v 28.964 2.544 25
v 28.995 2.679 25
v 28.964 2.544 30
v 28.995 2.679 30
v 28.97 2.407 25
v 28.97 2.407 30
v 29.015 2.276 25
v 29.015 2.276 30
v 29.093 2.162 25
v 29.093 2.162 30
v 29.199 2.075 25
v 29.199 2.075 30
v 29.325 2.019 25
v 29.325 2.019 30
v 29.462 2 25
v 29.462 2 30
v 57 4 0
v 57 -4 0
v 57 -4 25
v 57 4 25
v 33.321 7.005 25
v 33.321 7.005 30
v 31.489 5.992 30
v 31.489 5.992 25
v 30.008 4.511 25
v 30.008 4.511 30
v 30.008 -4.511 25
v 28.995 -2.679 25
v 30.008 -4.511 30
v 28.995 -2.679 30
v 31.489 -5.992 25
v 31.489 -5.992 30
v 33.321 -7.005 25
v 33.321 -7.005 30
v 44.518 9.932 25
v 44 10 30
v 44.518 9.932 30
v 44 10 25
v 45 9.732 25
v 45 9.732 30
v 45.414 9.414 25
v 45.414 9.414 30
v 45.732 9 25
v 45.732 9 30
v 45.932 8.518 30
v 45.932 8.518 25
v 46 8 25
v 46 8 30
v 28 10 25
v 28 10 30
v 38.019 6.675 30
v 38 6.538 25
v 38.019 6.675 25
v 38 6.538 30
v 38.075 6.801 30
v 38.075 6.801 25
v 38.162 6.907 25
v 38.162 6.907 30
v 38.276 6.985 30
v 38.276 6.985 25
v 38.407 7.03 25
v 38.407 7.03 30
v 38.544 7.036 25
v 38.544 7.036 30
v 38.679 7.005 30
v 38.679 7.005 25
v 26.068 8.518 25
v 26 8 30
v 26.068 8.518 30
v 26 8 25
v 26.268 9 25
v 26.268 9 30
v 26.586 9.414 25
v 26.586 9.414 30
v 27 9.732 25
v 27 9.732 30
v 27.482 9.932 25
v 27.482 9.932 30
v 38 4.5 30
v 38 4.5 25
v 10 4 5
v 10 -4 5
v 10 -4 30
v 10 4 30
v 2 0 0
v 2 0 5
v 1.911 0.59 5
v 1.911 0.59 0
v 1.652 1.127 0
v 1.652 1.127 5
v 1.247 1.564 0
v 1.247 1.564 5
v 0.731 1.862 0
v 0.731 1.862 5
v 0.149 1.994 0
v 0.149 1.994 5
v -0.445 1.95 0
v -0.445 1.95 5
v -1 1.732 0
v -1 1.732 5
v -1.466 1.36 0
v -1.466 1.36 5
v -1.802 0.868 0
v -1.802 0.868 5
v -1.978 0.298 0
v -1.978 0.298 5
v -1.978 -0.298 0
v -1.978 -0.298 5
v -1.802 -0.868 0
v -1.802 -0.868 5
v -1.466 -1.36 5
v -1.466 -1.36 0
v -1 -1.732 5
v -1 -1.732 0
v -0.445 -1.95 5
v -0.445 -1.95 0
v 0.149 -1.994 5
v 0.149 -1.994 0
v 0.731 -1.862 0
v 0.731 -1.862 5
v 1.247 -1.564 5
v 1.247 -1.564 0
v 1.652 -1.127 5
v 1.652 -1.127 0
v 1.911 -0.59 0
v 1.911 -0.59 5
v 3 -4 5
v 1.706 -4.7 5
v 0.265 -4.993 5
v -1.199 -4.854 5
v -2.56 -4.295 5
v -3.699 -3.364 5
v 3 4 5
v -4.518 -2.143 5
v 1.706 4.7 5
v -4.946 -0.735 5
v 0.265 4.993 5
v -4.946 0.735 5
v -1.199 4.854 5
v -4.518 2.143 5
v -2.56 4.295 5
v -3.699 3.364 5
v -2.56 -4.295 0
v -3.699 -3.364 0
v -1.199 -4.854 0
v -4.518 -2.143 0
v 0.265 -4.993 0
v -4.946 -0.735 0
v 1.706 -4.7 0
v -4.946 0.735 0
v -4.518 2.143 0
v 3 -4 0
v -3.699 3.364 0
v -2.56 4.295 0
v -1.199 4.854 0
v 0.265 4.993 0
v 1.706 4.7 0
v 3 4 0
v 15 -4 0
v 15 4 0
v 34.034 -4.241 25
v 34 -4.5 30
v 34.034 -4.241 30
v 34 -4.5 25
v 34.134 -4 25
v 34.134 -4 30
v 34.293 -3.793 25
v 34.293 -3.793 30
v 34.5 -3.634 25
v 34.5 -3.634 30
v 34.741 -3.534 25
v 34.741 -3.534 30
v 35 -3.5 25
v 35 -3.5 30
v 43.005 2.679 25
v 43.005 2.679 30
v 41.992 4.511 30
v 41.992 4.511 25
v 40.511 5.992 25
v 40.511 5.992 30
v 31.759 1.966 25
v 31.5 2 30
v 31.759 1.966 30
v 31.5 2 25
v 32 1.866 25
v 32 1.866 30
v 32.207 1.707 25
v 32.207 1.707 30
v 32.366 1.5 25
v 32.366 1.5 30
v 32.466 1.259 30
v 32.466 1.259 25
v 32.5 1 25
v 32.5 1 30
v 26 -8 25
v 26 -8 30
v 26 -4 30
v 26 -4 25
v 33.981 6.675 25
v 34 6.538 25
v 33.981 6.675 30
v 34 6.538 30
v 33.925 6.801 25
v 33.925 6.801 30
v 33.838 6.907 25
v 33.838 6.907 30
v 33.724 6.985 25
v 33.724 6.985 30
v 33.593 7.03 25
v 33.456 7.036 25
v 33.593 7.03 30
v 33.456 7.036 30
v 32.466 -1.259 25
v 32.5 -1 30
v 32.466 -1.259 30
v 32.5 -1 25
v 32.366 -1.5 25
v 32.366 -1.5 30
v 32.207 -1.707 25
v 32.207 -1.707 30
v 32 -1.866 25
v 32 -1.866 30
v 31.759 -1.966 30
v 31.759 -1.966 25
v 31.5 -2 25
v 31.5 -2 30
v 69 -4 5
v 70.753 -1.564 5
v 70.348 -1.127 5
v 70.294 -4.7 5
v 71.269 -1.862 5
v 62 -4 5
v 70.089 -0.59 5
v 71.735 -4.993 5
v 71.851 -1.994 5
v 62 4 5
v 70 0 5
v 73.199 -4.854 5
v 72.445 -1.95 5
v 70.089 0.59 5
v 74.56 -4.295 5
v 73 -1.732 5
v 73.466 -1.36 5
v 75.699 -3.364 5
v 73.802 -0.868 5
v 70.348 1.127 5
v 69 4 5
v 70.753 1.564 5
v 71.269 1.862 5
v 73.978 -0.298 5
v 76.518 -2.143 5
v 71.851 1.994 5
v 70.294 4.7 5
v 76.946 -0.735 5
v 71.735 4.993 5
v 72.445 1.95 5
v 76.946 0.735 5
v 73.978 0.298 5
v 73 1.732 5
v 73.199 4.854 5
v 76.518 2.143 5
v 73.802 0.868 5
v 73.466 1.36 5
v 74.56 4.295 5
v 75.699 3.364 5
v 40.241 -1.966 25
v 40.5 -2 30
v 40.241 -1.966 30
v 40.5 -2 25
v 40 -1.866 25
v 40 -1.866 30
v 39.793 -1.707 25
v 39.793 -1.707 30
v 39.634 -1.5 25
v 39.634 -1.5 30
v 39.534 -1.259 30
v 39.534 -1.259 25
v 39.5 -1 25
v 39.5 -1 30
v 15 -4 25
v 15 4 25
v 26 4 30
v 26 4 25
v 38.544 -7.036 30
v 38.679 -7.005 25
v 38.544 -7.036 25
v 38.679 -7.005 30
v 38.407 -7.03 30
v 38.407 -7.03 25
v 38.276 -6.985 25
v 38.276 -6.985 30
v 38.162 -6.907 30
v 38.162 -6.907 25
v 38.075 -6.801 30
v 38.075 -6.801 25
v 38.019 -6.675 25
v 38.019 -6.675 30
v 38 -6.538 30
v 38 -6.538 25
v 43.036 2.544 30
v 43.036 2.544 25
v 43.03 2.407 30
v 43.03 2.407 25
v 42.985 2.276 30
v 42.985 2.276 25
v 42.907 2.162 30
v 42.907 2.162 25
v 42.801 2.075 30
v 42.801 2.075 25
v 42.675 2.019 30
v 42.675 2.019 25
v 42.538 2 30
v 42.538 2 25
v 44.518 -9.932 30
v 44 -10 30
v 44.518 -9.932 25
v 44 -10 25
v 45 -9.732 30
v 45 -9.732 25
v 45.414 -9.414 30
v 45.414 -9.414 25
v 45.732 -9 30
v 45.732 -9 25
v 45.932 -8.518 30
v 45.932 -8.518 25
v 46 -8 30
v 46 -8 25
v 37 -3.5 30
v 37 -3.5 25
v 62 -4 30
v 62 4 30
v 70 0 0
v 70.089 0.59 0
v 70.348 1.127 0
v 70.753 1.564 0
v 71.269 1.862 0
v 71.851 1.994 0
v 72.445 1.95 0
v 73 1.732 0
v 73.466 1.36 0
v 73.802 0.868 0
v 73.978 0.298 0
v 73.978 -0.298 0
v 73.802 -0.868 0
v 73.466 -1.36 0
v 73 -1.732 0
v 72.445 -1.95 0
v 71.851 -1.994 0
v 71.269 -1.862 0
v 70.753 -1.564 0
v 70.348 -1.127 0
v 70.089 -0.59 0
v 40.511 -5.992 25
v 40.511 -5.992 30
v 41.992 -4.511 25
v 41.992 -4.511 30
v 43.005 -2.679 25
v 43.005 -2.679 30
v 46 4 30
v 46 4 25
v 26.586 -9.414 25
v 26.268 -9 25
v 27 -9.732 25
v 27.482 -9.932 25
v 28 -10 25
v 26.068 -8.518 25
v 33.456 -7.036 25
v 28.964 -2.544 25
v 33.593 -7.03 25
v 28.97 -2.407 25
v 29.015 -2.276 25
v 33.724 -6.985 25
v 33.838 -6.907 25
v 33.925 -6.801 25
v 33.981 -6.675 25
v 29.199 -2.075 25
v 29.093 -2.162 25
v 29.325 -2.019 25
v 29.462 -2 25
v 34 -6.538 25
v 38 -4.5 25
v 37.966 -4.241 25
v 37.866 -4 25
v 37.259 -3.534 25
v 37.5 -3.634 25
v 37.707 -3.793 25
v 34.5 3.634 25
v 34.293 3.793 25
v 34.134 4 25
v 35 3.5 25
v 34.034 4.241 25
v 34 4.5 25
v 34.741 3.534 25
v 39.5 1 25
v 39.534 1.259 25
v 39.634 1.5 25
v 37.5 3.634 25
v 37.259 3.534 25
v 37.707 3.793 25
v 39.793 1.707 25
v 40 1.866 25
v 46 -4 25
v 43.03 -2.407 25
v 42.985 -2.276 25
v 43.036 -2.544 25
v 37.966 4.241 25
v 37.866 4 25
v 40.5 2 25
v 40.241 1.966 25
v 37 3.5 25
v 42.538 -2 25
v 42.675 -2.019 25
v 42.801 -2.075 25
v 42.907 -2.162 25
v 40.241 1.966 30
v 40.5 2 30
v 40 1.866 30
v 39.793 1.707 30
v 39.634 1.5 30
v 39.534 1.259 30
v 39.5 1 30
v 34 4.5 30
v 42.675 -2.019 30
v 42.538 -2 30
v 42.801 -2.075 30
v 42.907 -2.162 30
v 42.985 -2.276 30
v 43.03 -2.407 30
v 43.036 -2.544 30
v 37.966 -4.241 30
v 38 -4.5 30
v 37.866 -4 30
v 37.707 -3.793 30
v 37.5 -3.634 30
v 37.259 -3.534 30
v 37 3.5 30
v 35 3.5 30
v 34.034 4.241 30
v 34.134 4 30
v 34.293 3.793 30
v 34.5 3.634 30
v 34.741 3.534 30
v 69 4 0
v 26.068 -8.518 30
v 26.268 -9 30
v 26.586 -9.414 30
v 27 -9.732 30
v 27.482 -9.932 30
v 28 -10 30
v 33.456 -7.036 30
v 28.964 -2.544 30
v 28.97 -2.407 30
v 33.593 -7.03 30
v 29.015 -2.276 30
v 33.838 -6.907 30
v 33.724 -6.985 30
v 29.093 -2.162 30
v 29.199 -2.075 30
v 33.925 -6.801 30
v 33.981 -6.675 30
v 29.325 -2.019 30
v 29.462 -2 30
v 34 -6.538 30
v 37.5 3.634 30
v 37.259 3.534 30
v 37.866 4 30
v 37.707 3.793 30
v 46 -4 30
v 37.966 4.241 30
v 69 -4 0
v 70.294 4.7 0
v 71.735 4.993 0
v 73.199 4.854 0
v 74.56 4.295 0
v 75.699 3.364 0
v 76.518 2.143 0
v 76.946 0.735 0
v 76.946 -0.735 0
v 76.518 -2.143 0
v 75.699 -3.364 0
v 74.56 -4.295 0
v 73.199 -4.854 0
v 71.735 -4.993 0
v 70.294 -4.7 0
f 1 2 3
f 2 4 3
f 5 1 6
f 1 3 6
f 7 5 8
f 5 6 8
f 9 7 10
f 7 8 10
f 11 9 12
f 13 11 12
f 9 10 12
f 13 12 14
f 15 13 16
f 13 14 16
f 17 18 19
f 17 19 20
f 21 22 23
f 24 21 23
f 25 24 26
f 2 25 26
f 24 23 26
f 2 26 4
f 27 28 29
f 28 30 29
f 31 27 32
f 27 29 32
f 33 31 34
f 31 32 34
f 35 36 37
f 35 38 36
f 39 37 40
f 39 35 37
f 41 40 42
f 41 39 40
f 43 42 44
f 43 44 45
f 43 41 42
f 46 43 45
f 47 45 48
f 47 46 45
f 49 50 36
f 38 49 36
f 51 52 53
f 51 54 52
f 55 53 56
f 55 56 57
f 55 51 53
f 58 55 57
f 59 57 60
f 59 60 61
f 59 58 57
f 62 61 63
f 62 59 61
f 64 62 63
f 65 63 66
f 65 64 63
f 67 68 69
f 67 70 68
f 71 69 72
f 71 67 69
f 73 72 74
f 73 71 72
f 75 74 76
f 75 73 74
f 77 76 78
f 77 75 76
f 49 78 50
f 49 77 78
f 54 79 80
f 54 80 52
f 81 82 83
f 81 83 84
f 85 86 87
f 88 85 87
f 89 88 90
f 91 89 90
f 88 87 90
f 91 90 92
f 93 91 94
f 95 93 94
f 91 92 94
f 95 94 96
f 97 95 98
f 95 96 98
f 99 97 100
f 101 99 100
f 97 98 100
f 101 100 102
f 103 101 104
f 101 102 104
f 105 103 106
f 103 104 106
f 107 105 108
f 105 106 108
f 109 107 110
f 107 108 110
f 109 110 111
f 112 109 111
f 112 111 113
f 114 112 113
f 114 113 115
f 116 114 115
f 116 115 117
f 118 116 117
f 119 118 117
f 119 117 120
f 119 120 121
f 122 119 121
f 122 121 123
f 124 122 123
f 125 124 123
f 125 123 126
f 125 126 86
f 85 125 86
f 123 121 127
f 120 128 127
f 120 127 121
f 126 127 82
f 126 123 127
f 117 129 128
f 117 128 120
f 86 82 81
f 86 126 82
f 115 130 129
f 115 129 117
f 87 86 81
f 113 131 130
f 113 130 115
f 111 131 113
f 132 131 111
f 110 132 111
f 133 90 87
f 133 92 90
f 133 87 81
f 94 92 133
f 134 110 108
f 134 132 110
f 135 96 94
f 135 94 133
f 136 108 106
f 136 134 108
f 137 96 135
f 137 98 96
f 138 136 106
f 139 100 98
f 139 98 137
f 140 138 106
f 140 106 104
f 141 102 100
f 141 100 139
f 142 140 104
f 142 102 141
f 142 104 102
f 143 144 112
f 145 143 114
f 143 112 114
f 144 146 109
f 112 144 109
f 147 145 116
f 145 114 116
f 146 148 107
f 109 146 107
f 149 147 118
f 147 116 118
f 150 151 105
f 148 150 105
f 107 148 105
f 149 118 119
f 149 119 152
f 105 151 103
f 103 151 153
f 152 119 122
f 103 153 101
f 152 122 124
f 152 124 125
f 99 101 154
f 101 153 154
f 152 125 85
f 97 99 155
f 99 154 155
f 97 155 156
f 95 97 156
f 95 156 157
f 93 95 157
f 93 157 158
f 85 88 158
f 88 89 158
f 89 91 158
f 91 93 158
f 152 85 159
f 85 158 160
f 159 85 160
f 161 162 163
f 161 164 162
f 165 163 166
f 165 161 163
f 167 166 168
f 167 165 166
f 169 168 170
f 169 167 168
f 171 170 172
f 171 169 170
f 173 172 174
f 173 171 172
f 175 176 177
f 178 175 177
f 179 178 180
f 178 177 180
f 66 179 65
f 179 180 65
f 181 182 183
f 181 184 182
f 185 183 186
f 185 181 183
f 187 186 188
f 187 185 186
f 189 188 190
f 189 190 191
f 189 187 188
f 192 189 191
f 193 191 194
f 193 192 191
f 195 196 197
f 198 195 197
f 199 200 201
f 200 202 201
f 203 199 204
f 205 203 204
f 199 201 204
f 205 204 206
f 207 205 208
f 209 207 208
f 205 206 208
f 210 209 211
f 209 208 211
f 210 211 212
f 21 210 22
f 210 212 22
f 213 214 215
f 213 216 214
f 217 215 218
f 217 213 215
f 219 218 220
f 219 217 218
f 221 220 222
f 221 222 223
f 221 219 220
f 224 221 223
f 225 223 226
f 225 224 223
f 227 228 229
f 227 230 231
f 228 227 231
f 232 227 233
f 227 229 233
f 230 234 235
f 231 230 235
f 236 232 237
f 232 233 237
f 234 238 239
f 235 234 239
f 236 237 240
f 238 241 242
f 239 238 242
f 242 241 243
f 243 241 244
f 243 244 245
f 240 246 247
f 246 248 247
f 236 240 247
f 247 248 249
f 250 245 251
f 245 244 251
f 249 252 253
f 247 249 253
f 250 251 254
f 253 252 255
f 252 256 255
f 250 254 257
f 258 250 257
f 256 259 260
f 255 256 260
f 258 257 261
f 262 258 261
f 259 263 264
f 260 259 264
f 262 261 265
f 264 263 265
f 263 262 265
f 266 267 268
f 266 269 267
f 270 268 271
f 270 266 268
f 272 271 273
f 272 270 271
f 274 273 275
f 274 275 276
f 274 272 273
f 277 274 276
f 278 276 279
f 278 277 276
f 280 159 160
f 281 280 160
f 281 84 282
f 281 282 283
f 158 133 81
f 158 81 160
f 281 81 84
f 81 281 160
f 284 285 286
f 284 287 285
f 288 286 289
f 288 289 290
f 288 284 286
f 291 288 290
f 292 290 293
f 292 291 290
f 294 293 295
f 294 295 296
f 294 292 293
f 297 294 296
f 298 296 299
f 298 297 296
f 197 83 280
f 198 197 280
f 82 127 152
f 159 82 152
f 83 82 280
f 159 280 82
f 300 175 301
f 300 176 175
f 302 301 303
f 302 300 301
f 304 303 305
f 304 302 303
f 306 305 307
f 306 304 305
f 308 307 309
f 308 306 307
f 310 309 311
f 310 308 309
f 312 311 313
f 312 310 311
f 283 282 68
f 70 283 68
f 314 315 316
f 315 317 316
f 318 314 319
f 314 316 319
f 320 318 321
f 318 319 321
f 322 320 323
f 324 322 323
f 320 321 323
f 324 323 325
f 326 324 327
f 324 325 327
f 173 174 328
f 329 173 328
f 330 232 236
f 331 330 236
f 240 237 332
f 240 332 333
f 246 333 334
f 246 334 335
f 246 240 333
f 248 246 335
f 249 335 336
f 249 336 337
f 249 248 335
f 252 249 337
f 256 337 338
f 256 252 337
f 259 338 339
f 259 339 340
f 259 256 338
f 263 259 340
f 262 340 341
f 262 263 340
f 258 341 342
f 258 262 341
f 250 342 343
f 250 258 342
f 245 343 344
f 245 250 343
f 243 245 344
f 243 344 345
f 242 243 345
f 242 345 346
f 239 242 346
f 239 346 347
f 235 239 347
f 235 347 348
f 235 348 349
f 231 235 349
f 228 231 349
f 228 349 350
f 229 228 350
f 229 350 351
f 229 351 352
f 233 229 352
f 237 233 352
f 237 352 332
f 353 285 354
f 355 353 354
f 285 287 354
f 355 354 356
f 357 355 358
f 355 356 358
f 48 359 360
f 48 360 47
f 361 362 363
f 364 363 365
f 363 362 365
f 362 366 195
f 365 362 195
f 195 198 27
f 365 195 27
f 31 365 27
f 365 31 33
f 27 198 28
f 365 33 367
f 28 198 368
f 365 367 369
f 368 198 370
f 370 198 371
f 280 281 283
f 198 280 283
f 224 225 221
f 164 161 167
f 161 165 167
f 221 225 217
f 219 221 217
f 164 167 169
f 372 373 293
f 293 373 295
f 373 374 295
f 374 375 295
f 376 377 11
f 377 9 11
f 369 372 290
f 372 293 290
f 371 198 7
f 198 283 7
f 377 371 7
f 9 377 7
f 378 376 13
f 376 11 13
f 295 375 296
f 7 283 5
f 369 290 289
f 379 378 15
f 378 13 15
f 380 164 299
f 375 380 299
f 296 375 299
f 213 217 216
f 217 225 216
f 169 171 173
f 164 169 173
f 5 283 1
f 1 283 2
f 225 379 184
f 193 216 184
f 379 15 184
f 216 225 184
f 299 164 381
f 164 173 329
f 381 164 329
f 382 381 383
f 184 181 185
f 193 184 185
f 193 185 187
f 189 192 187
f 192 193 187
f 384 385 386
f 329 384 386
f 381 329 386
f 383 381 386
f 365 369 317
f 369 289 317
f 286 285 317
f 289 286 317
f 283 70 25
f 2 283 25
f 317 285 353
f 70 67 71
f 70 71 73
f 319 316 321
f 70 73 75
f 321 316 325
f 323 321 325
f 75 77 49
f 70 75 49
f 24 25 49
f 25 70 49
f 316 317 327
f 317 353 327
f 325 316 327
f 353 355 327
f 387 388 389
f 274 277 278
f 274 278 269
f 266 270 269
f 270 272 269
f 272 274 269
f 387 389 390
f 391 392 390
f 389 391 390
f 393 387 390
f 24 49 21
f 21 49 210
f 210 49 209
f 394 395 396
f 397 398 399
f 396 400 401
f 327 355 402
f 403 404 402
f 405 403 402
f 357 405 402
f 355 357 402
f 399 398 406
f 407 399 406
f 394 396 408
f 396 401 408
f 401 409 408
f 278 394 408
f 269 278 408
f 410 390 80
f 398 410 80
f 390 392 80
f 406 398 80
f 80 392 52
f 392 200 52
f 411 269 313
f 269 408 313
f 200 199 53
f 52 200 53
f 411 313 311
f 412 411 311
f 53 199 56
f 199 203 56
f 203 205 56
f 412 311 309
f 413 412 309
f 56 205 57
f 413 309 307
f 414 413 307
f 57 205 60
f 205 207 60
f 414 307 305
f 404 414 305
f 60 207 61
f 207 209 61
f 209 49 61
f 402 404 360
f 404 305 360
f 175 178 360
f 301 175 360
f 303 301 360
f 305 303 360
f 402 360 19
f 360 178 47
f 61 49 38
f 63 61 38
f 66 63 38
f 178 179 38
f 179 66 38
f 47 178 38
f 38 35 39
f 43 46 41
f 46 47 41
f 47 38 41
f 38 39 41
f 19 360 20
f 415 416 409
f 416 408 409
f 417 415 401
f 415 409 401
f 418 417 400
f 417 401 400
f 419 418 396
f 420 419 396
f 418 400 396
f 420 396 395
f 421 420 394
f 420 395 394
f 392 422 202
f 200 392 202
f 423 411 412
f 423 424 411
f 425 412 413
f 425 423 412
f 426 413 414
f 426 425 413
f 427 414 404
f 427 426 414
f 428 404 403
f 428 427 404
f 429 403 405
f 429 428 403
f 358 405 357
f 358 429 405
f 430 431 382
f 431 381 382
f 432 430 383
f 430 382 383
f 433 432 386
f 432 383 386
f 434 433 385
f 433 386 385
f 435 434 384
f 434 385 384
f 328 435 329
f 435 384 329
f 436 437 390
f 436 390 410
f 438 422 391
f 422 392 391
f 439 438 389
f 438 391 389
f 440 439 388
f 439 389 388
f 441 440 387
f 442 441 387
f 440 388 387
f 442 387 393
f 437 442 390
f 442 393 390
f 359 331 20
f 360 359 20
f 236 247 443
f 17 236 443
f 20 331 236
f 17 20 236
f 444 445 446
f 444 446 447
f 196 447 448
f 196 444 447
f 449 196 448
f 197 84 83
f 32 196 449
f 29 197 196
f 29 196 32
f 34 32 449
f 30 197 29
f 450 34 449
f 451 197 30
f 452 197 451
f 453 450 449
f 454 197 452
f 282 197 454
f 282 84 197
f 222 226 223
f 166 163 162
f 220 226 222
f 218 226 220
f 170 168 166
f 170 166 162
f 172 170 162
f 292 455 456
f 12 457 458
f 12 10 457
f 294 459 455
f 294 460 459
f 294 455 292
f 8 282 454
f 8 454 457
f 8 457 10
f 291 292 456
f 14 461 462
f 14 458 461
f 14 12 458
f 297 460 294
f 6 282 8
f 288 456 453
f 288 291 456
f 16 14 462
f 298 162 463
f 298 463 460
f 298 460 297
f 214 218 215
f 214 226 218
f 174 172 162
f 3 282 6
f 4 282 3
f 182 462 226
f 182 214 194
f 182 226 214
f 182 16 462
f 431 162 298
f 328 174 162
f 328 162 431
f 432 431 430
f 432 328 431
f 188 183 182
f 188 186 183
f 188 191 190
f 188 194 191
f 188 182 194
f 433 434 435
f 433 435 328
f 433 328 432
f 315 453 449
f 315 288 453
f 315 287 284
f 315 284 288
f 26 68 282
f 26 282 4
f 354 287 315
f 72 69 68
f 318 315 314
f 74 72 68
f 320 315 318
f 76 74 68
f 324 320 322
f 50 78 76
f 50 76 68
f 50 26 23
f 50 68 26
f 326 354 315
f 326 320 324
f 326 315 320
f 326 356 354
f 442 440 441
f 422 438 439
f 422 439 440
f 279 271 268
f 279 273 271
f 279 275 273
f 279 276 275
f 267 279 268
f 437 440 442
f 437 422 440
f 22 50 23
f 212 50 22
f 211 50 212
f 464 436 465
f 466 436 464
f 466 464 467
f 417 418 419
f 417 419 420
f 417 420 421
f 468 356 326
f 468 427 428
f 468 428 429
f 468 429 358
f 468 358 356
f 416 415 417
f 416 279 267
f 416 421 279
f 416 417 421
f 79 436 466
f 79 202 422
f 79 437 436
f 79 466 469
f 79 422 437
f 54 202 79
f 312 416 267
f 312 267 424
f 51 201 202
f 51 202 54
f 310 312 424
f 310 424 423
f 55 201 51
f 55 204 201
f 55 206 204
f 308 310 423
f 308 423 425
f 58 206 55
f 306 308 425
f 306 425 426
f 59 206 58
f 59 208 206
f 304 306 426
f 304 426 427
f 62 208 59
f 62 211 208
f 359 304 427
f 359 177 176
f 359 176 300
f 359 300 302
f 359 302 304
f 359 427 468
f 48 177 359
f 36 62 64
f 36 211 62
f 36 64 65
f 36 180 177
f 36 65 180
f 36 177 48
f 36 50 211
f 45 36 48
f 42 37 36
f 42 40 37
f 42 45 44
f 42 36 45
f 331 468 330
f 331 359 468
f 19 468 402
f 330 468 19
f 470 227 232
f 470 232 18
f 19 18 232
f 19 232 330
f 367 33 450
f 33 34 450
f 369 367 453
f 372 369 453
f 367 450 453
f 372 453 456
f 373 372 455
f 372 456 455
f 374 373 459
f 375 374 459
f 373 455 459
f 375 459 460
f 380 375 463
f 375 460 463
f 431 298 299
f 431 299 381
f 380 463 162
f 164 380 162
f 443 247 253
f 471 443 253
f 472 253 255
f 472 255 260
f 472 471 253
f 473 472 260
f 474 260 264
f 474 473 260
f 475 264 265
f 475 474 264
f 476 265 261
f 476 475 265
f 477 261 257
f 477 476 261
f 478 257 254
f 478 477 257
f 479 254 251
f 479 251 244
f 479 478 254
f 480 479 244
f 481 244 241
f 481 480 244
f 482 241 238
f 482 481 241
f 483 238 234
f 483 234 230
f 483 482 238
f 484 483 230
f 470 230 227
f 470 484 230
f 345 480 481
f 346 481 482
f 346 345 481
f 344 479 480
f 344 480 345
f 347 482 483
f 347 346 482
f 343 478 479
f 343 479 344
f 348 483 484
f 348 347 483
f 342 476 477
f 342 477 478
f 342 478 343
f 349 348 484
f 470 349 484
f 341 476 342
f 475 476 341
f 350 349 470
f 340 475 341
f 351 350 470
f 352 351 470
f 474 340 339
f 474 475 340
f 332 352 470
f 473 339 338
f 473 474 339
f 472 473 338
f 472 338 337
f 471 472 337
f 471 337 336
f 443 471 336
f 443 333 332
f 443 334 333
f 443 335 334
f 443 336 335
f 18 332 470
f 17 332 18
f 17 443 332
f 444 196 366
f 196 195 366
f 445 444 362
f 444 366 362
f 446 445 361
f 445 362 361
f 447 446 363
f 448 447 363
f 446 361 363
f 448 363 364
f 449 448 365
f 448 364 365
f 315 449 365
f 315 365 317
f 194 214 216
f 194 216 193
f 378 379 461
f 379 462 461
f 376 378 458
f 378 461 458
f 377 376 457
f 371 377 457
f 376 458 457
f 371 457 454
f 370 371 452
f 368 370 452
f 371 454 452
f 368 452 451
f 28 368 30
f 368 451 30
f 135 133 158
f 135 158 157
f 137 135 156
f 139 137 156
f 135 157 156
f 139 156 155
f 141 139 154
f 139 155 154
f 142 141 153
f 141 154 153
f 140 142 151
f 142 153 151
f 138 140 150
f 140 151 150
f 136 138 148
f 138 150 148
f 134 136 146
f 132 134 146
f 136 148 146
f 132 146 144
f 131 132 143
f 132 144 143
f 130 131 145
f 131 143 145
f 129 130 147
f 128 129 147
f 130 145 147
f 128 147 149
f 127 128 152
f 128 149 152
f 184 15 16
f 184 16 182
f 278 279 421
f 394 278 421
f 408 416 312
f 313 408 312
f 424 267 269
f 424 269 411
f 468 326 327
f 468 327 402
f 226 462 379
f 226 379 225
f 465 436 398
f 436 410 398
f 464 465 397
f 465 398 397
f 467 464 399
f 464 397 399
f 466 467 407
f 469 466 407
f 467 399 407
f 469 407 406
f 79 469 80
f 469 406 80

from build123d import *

# Parameters (mm, degrees)
SKETCH_1_R          = 5
EXTRUDE_1_DEPTH     = 5
SKETCH_3_W          = 5
SKETCH_3_H          = 8
EXTRUDE_2_DEPTH     = 15
SKETCH_2_R          = 2
CUT_EXTRUDE_1_DEPTH = 30
SKETCH_6_W          = 5
SKETCH_6_H          = 8
EXTRUDE_4_DEPTH     = 25
SKETCH_7_W          = 5
SKETCH_7_H          = 8
EXTRUDE_5_DEPTH     = 21
SKETCH_8_W          = 20
SKETCH_8_H          = 20
EXTRUDE_6_DEPTH     = 5
FILLET_2_R          = 2
SKETCH_9_R          = 7.5
CUT_EXTRUDE_3_DEPTH = 5
SKETCH_10_W         = 4
SKETCH_10_H         = 4
EXTRUDE_7_DEPTH     = 5
FILLET_3_R          = 1
FILLET_4_R          = 0.5


with BuildPart() as part:
    # 草图1 → 凸台-拉伸1 (new body)
    with BuildSketch(Plane.XY):
        Circle(SKETCH_1_R)
    extrude(amount=EXTRUDE_1_DEPTH)

    # 草图3 → 凸台-拉伸2 (add)
    with BuildSketch(Plane(origin=(0, 0, 0), x_dir=(0, 0, -1), z_dir=(1, 0, 0))):
        with Locations((-2.5, 0)):
            Rectangle(SKETCH_3_W, SKETCH_3_H)
    extrude(amount=EXTRUDE_2_DEPTH)

    # 草图2 → 切除-拉伸1 (cut)
    with BuildSketch(Plane.XY.offset(5)):
        Circle(SKETCH_2_R)
    extrude(amount=-CUT_EXTRUDE_1_DEPTH, mode=Mode.SUBTRACT)

    # 草图6 → 凸台-拉伸4 (add)
    with BuildSketch(Plane.XY.offset(5)):
        with Locations((12.5, 0)):
            Rectangle(SKETCH_6_W, SKETCH_6_H)
    extrude(amount=EXTRUDE_4_DEPTH)

    # 草图7 → 凸台-拉伸5 (add)
    with BuildSketch(Plane(origin=(15, 0, 0), x_dir=(0, 0, -1), z_dir=(1, 0, 0))):
        with Locations((-27.5, 0)):
            Rectangle(SKETCH_7_W, SKETCH_7_H)
    extrude(amount=EXTRUDE_5_DEPTH)

    # 镜向2: part across plane


with BuildPart() as part_1:
    add(part.part)
    add(part.part.mirror(Plane(origin=(36, 0, 0), x_dir=(0, 0, 1), z_dir=(1, 0, 0))))

    # 草图8 → 凸台-拉伸6 (add)
    with BuildSketch(Plane.XY.offset(30)):
        with Locations((36, 0)):
            Rectangle(SKETCH_8_W, SKETCH_8_H)
    extrude(amount=-EXTRUDE_6_DEPTH)

    # 圆角2
    fillet_2_edges = [part_1.edges().sort_by_distance(p)[0] for p in [
        (26, -10, 27.5),
        (46, 10, 27.5),
        (26, 10, 27.5),
        (46, -10, 27.5),
    ]]
    fillet(fillet_2_edges, radius=FILLET_2_R)

    # 草图9 → 切除-拉伸3 (cut)
    with BuildSketch(Plane.XY.offset(30)):
        with Locations((36, 0)):
            Circle(SKETCH_9_R)
    extrude(amount=-CUT_EXTRUDE_3_DEPTH, mode=Mode.SUBTRACT)

    # 草图10 → 凸台-拉伸7 (add)
    with BuildSketch(Plane.XY.offset(30)):
        with Locations((36, 5.5)):
            Rectangle(SKETCH_10_W, SKETCH_10_H)
        with Locations((41.5, 0)):
            Rectangle(SKETCH_10_W, SKETCH_10_H)
        with Locations((36, -5.5)):
            Rectangle(SKETCH_10_W, SKETCH_10_H)
        with Locations((30.5, 0)):
            Rectangle(SKETCH_10_W, SKETCH_10_H)
    extrude(amount=-EXTRUDE_7_DEPTH)

    # 圆角3
    fillet_3_edges = [part_1.edges().sort_by_distance(p)[0] for p in [
        (34, 3.5, 27.5),
        (38, 3.5, 27.5),
        (39.5, 2, 27.5),
        (39.5, -2, 27.5),
        (38, -3.5, 27.5),
        (34, -3.5, 27.5),
        (32.5, -2, 27.5),
        (32.5, 2, 27.5),
    ]]
    fillet(fillet_3_edges, radius=FILLET_3_R)

    # 圆角4
    fillet_4_edges = [part_1.edges().sort_by_distance(p)[0] for p in [
        (38, 7.228416147, 27.5),
        (34, 7.228416147, 27.5),
        (43.228416147, -2, 27.5),
        (43.228416147, 2, 27.5),
        (34, -7.228416147, 27.5),
        (38, -7.228416147, 27.5),
        (28.771583853, 2, 27.5),
        (28.771583853, -2, 27.5),
    ]]
    fillet(fillet_4_edges, radius=FILLET_4_R)


solid = part_1.part
